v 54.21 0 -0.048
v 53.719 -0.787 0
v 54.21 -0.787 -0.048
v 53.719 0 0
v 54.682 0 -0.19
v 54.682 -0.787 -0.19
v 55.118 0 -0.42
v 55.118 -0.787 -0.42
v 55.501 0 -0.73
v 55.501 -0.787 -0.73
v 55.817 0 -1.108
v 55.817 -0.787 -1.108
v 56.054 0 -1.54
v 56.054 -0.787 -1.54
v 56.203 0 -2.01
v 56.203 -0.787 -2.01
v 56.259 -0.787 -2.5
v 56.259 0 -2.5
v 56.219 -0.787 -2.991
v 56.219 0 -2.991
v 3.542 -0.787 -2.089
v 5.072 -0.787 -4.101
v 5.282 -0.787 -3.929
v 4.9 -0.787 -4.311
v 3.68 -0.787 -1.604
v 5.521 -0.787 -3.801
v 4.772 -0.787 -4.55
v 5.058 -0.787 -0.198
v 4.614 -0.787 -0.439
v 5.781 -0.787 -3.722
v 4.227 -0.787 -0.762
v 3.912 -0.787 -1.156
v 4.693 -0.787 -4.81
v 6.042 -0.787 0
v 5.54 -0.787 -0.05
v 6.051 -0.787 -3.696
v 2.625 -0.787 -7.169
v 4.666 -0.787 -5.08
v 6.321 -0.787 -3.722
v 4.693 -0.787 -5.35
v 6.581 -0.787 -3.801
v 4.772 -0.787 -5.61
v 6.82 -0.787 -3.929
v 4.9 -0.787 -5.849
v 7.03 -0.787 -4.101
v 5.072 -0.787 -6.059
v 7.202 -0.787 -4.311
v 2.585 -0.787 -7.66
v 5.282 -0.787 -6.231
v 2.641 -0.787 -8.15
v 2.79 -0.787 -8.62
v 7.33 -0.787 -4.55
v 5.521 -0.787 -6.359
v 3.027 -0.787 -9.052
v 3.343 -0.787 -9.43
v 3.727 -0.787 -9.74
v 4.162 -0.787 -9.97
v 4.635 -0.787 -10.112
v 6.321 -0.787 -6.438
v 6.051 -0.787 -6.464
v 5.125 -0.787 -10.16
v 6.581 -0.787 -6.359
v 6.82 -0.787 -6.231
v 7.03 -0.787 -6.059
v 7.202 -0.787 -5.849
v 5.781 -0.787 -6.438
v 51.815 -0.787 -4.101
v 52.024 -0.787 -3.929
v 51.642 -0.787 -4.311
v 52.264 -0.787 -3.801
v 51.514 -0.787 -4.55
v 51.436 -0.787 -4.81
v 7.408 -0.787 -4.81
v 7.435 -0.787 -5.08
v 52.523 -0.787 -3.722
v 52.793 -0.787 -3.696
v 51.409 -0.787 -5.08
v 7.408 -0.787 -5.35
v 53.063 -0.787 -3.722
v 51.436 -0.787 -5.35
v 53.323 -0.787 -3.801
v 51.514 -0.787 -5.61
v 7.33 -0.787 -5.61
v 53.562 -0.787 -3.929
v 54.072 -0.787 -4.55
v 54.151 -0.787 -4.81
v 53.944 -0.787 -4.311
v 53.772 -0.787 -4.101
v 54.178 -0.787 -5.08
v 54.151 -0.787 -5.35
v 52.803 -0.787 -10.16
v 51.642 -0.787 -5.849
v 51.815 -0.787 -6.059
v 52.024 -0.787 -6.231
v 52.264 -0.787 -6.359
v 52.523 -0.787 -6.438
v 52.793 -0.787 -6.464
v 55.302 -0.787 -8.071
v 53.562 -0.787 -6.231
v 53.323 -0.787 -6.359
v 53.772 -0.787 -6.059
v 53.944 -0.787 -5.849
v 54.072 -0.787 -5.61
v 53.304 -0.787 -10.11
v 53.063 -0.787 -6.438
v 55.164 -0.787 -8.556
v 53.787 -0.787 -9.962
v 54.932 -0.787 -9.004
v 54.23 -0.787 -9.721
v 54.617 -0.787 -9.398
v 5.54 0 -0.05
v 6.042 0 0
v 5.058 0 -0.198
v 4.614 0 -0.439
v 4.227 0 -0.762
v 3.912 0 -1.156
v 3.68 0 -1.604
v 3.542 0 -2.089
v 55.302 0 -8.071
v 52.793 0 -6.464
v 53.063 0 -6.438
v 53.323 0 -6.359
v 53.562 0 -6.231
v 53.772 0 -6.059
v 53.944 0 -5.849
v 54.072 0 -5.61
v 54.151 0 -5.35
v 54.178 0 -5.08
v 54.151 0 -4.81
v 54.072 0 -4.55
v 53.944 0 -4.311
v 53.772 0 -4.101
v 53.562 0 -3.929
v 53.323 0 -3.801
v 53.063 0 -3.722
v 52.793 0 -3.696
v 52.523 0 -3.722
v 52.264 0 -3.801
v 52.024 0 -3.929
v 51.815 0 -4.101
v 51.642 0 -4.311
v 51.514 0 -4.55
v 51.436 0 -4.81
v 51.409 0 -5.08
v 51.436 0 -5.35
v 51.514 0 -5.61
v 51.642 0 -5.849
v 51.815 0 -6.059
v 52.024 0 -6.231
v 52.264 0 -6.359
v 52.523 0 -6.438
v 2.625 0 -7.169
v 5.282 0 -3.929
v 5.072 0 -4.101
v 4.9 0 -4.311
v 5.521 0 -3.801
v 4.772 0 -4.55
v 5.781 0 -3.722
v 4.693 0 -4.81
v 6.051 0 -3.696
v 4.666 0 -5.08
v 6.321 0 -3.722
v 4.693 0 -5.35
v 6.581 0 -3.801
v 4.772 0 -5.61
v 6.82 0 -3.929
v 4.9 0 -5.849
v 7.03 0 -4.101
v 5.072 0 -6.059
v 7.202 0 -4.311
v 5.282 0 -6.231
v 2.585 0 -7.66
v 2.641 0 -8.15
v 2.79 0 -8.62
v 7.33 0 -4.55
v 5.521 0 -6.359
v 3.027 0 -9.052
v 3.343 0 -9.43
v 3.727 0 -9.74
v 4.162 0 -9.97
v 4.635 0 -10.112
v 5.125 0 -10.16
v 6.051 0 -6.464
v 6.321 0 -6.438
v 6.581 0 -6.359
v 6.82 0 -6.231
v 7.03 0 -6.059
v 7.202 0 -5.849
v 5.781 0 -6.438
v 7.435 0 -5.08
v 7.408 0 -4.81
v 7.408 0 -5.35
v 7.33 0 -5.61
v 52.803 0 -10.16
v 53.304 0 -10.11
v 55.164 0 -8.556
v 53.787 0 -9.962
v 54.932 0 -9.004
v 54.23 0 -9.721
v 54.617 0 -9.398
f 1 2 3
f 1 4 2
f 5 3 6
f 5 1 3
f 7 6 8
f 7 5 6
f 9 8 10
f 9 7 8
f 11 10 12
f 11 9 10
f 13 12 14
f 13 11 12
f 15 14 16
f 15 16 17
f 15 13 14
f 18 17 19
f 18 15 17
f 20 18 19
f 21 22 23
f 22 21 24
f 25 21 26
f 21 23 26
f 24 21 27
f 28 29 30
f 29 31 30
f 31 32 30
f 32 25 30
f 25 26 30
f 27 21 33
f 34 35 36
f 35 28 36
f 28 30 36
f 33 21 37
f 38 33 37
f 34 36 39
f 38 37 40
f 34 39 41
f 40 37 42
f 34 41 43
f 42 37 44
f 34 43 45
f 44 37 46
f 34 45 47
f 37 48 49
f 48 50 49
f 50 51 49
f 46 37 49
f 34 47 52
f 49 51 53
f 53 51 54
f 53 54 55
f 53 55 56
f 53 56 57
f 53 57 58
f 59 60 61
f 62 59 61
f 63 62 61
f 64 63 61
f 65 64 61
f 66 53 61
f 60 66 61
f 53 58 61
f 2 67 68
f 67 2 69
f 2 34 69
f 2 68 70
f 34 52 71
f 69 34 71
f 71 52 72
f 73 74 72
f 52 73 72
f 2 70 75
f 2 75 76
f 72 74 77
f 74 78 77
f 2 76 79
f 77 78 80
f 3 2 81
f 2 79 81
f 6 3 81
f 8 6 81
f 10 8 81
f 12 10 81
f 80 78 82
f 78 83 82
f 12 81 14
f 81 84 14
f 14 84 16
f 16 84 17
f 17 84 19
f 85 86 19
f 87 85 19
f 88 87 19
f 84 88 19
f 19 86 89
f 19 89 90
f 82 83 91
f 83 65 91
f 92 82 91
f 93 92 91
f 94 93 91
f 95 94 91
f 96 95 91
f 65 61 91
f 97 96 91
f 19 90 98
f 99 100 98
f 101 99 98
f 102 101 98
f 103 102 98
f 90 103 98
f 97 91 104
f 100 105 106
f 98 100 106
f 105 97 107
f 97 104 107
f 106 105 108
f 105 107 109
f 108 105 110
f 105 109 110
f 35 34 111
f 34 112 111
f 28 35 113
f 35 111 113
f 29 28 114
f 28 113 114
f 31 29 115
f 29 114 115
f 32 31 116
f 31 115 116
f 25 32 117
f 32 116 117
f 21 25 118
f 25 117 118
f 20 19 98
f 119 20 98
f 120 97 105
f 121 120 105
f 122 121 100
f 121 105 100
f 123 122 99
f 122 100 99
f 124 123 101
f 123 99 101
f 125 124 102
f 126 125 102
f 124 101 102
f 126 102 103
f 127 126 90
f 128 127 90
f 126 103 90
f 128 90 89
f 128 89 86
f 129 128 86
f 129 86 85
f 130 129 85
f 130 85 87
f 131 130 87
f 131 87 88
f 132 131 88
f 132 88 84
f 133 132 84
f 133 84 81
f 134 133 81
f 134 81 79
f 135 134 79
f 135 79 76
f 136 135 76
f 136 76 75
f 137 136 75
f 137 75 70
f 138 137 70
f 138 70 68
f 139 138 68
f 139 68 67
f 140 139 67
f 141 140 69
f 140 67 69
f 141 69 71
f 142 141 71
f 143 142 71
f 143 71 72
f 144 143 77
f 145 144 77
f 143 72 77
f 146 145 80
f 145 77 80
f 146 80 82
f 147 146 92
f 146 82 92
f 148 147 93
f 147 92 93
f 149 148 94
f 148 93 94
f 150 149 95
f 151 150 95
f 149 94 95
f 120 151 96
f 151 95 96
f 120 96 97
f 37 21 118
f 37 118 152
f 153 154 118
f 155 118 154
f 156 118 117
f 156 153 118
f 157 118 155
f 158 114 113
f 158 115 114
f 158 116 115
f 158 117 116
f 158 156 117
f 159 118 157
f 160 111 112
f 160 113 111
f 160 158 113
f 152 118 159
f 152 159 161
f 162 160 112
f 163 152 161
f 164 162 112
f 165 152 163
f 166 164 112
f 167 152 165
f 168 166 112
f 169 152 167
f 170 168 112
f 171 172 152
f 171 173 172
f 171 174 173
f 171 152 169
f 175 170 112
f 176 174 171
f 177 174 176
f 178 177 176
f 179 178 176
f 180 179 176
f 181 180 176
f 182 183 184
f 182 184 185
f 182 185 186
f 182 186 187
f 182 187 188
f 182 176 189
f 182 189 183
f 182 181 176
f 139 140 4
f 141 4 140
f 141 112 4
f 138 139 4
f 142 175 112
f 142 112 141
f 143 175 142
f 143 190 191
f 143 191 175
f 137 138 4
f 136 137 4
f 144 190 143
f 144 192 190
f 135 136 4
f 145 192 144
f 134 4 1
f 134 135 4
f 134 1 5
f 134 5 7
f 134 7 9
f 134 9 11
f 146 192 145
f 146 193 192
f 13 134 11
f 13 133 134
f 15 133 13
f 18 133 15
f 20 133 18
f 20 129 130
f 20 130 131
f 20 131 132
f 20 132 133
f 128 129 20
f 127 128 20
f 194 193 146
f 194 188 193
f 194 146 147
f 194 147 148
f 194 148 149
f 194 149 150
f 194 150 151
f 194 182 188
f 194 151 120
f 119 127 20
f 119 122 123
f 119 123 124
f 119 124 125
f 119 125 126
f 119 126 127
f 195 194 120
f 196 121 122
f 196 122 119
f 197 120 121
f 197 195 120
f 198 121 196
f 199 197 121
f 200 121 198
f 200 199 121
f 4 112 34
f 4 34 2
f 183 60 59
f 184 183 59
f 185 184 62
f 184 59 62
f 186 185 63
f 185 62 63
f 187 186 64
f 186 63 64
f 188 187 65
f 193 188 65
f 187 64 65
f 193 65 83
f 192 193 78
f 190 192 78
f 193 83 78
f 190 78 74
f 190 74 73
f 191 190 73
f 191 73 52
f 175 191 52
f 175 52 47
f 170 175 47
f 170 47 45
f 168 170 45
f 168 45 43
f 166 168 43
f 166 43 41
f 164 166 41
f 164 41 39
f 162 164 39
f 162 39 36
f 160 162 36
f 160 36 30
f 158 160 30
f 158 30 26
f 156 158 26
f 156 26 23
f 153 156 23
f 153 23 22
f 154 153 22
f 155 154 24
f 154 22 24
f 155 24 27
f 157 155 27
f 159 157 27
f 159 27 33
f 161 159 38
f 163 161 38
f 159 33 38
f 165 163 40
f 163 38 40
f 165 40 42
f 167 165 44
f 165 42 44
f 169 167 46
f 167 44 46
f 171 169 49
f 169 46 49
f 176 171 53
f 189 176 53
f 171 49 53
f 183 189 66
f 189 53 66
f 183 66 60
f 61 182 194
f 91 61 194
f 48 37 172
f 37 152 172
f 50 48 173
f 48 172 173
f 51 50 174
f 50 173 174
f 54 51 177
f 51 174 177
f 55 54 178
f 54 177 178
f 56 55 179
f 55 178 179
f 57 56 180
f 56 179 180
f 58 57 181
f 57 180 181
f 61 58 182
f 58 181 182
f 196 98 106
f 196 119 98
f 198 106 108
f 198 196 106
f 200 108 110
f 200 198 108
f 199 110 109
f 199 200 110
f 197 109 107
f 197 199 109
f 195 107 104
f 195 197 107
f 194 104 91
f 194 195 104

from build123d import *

# Parameters (mm, degrees)
SKETCH1_W          = 58.648623675
SKETCH1_H          = 10.16
BASE_FLANGE1_DEPTH = 0.7874
SKETCH3_R          = 1.3843
CUT_EXTRUDE1_DEPTH = 60.527360581
CUT_EXTRUDE2_DEPTH = 60.527360581
FILLET1_R          = 2.54


# Sheet-metal steps are written as plain solids
with BuildPart() as part:
    # Sketch1 → Base-Flange1 (new body)
    with BuildSketch(Plane(origin=(0, 0, 0), x_dir=(1, 0, 0), z_dir=(0, 1, 0))):
        with Locations((29.324311838, 5.08)):
            Rectangle(SKETCH1_W, SKETCH1_H)
    extrude(amount=-BASE_FLANGE1_DEPTH)

    # Sketch3 → Cut-Extrude1 (cut, through all)
    with BuildSketch(Plane.XZ.offset(0.7874)):
        with Locations(Location((52.793349192, -5.08, 0), (0, 0, 270))):
            Circle(SKETCH3_R)
        with Locations(Location((6.050755325, -5.08, 0), (0, 0, 270))):
            Circle(SKETCH3_R)
    extrude(amount=-CUT_EXTRUDE1_DEPTH, mode=Mode.SUBTRACT)

    # Sketch4 → Cut-Extrude2 (cut, through all)
    with BuildSketch(Plane.XZ.offset(0.7874)):
        Polygon((54.925303053, -10.16), (58.648623675, -10.16), (58.648623675, 0), (56.758255401, 0), align=None)
        Polygon((2.085849116, -10.16), (0, -10.16), (0, 0), (3.918801464, 0), align=None)
    extrude(amount=-CUT_EXTRUDE2_DEPTH, mode=Mode.SUBTRACT)

    # Fillet1
    fillet1_edges = [part.edges().sort_by_distance(p)[0] for p in [
        (3.918801464, -0.3937, 0),
        (2.085849116, -0.3937, -10.16),
        (54.925303053, -0.3937, -10.16),
        (56.758255401, -0.3937, 0),
    ]]
    fillet(fillet1_edges, radius=FILLET1_R)


solid = part.part
